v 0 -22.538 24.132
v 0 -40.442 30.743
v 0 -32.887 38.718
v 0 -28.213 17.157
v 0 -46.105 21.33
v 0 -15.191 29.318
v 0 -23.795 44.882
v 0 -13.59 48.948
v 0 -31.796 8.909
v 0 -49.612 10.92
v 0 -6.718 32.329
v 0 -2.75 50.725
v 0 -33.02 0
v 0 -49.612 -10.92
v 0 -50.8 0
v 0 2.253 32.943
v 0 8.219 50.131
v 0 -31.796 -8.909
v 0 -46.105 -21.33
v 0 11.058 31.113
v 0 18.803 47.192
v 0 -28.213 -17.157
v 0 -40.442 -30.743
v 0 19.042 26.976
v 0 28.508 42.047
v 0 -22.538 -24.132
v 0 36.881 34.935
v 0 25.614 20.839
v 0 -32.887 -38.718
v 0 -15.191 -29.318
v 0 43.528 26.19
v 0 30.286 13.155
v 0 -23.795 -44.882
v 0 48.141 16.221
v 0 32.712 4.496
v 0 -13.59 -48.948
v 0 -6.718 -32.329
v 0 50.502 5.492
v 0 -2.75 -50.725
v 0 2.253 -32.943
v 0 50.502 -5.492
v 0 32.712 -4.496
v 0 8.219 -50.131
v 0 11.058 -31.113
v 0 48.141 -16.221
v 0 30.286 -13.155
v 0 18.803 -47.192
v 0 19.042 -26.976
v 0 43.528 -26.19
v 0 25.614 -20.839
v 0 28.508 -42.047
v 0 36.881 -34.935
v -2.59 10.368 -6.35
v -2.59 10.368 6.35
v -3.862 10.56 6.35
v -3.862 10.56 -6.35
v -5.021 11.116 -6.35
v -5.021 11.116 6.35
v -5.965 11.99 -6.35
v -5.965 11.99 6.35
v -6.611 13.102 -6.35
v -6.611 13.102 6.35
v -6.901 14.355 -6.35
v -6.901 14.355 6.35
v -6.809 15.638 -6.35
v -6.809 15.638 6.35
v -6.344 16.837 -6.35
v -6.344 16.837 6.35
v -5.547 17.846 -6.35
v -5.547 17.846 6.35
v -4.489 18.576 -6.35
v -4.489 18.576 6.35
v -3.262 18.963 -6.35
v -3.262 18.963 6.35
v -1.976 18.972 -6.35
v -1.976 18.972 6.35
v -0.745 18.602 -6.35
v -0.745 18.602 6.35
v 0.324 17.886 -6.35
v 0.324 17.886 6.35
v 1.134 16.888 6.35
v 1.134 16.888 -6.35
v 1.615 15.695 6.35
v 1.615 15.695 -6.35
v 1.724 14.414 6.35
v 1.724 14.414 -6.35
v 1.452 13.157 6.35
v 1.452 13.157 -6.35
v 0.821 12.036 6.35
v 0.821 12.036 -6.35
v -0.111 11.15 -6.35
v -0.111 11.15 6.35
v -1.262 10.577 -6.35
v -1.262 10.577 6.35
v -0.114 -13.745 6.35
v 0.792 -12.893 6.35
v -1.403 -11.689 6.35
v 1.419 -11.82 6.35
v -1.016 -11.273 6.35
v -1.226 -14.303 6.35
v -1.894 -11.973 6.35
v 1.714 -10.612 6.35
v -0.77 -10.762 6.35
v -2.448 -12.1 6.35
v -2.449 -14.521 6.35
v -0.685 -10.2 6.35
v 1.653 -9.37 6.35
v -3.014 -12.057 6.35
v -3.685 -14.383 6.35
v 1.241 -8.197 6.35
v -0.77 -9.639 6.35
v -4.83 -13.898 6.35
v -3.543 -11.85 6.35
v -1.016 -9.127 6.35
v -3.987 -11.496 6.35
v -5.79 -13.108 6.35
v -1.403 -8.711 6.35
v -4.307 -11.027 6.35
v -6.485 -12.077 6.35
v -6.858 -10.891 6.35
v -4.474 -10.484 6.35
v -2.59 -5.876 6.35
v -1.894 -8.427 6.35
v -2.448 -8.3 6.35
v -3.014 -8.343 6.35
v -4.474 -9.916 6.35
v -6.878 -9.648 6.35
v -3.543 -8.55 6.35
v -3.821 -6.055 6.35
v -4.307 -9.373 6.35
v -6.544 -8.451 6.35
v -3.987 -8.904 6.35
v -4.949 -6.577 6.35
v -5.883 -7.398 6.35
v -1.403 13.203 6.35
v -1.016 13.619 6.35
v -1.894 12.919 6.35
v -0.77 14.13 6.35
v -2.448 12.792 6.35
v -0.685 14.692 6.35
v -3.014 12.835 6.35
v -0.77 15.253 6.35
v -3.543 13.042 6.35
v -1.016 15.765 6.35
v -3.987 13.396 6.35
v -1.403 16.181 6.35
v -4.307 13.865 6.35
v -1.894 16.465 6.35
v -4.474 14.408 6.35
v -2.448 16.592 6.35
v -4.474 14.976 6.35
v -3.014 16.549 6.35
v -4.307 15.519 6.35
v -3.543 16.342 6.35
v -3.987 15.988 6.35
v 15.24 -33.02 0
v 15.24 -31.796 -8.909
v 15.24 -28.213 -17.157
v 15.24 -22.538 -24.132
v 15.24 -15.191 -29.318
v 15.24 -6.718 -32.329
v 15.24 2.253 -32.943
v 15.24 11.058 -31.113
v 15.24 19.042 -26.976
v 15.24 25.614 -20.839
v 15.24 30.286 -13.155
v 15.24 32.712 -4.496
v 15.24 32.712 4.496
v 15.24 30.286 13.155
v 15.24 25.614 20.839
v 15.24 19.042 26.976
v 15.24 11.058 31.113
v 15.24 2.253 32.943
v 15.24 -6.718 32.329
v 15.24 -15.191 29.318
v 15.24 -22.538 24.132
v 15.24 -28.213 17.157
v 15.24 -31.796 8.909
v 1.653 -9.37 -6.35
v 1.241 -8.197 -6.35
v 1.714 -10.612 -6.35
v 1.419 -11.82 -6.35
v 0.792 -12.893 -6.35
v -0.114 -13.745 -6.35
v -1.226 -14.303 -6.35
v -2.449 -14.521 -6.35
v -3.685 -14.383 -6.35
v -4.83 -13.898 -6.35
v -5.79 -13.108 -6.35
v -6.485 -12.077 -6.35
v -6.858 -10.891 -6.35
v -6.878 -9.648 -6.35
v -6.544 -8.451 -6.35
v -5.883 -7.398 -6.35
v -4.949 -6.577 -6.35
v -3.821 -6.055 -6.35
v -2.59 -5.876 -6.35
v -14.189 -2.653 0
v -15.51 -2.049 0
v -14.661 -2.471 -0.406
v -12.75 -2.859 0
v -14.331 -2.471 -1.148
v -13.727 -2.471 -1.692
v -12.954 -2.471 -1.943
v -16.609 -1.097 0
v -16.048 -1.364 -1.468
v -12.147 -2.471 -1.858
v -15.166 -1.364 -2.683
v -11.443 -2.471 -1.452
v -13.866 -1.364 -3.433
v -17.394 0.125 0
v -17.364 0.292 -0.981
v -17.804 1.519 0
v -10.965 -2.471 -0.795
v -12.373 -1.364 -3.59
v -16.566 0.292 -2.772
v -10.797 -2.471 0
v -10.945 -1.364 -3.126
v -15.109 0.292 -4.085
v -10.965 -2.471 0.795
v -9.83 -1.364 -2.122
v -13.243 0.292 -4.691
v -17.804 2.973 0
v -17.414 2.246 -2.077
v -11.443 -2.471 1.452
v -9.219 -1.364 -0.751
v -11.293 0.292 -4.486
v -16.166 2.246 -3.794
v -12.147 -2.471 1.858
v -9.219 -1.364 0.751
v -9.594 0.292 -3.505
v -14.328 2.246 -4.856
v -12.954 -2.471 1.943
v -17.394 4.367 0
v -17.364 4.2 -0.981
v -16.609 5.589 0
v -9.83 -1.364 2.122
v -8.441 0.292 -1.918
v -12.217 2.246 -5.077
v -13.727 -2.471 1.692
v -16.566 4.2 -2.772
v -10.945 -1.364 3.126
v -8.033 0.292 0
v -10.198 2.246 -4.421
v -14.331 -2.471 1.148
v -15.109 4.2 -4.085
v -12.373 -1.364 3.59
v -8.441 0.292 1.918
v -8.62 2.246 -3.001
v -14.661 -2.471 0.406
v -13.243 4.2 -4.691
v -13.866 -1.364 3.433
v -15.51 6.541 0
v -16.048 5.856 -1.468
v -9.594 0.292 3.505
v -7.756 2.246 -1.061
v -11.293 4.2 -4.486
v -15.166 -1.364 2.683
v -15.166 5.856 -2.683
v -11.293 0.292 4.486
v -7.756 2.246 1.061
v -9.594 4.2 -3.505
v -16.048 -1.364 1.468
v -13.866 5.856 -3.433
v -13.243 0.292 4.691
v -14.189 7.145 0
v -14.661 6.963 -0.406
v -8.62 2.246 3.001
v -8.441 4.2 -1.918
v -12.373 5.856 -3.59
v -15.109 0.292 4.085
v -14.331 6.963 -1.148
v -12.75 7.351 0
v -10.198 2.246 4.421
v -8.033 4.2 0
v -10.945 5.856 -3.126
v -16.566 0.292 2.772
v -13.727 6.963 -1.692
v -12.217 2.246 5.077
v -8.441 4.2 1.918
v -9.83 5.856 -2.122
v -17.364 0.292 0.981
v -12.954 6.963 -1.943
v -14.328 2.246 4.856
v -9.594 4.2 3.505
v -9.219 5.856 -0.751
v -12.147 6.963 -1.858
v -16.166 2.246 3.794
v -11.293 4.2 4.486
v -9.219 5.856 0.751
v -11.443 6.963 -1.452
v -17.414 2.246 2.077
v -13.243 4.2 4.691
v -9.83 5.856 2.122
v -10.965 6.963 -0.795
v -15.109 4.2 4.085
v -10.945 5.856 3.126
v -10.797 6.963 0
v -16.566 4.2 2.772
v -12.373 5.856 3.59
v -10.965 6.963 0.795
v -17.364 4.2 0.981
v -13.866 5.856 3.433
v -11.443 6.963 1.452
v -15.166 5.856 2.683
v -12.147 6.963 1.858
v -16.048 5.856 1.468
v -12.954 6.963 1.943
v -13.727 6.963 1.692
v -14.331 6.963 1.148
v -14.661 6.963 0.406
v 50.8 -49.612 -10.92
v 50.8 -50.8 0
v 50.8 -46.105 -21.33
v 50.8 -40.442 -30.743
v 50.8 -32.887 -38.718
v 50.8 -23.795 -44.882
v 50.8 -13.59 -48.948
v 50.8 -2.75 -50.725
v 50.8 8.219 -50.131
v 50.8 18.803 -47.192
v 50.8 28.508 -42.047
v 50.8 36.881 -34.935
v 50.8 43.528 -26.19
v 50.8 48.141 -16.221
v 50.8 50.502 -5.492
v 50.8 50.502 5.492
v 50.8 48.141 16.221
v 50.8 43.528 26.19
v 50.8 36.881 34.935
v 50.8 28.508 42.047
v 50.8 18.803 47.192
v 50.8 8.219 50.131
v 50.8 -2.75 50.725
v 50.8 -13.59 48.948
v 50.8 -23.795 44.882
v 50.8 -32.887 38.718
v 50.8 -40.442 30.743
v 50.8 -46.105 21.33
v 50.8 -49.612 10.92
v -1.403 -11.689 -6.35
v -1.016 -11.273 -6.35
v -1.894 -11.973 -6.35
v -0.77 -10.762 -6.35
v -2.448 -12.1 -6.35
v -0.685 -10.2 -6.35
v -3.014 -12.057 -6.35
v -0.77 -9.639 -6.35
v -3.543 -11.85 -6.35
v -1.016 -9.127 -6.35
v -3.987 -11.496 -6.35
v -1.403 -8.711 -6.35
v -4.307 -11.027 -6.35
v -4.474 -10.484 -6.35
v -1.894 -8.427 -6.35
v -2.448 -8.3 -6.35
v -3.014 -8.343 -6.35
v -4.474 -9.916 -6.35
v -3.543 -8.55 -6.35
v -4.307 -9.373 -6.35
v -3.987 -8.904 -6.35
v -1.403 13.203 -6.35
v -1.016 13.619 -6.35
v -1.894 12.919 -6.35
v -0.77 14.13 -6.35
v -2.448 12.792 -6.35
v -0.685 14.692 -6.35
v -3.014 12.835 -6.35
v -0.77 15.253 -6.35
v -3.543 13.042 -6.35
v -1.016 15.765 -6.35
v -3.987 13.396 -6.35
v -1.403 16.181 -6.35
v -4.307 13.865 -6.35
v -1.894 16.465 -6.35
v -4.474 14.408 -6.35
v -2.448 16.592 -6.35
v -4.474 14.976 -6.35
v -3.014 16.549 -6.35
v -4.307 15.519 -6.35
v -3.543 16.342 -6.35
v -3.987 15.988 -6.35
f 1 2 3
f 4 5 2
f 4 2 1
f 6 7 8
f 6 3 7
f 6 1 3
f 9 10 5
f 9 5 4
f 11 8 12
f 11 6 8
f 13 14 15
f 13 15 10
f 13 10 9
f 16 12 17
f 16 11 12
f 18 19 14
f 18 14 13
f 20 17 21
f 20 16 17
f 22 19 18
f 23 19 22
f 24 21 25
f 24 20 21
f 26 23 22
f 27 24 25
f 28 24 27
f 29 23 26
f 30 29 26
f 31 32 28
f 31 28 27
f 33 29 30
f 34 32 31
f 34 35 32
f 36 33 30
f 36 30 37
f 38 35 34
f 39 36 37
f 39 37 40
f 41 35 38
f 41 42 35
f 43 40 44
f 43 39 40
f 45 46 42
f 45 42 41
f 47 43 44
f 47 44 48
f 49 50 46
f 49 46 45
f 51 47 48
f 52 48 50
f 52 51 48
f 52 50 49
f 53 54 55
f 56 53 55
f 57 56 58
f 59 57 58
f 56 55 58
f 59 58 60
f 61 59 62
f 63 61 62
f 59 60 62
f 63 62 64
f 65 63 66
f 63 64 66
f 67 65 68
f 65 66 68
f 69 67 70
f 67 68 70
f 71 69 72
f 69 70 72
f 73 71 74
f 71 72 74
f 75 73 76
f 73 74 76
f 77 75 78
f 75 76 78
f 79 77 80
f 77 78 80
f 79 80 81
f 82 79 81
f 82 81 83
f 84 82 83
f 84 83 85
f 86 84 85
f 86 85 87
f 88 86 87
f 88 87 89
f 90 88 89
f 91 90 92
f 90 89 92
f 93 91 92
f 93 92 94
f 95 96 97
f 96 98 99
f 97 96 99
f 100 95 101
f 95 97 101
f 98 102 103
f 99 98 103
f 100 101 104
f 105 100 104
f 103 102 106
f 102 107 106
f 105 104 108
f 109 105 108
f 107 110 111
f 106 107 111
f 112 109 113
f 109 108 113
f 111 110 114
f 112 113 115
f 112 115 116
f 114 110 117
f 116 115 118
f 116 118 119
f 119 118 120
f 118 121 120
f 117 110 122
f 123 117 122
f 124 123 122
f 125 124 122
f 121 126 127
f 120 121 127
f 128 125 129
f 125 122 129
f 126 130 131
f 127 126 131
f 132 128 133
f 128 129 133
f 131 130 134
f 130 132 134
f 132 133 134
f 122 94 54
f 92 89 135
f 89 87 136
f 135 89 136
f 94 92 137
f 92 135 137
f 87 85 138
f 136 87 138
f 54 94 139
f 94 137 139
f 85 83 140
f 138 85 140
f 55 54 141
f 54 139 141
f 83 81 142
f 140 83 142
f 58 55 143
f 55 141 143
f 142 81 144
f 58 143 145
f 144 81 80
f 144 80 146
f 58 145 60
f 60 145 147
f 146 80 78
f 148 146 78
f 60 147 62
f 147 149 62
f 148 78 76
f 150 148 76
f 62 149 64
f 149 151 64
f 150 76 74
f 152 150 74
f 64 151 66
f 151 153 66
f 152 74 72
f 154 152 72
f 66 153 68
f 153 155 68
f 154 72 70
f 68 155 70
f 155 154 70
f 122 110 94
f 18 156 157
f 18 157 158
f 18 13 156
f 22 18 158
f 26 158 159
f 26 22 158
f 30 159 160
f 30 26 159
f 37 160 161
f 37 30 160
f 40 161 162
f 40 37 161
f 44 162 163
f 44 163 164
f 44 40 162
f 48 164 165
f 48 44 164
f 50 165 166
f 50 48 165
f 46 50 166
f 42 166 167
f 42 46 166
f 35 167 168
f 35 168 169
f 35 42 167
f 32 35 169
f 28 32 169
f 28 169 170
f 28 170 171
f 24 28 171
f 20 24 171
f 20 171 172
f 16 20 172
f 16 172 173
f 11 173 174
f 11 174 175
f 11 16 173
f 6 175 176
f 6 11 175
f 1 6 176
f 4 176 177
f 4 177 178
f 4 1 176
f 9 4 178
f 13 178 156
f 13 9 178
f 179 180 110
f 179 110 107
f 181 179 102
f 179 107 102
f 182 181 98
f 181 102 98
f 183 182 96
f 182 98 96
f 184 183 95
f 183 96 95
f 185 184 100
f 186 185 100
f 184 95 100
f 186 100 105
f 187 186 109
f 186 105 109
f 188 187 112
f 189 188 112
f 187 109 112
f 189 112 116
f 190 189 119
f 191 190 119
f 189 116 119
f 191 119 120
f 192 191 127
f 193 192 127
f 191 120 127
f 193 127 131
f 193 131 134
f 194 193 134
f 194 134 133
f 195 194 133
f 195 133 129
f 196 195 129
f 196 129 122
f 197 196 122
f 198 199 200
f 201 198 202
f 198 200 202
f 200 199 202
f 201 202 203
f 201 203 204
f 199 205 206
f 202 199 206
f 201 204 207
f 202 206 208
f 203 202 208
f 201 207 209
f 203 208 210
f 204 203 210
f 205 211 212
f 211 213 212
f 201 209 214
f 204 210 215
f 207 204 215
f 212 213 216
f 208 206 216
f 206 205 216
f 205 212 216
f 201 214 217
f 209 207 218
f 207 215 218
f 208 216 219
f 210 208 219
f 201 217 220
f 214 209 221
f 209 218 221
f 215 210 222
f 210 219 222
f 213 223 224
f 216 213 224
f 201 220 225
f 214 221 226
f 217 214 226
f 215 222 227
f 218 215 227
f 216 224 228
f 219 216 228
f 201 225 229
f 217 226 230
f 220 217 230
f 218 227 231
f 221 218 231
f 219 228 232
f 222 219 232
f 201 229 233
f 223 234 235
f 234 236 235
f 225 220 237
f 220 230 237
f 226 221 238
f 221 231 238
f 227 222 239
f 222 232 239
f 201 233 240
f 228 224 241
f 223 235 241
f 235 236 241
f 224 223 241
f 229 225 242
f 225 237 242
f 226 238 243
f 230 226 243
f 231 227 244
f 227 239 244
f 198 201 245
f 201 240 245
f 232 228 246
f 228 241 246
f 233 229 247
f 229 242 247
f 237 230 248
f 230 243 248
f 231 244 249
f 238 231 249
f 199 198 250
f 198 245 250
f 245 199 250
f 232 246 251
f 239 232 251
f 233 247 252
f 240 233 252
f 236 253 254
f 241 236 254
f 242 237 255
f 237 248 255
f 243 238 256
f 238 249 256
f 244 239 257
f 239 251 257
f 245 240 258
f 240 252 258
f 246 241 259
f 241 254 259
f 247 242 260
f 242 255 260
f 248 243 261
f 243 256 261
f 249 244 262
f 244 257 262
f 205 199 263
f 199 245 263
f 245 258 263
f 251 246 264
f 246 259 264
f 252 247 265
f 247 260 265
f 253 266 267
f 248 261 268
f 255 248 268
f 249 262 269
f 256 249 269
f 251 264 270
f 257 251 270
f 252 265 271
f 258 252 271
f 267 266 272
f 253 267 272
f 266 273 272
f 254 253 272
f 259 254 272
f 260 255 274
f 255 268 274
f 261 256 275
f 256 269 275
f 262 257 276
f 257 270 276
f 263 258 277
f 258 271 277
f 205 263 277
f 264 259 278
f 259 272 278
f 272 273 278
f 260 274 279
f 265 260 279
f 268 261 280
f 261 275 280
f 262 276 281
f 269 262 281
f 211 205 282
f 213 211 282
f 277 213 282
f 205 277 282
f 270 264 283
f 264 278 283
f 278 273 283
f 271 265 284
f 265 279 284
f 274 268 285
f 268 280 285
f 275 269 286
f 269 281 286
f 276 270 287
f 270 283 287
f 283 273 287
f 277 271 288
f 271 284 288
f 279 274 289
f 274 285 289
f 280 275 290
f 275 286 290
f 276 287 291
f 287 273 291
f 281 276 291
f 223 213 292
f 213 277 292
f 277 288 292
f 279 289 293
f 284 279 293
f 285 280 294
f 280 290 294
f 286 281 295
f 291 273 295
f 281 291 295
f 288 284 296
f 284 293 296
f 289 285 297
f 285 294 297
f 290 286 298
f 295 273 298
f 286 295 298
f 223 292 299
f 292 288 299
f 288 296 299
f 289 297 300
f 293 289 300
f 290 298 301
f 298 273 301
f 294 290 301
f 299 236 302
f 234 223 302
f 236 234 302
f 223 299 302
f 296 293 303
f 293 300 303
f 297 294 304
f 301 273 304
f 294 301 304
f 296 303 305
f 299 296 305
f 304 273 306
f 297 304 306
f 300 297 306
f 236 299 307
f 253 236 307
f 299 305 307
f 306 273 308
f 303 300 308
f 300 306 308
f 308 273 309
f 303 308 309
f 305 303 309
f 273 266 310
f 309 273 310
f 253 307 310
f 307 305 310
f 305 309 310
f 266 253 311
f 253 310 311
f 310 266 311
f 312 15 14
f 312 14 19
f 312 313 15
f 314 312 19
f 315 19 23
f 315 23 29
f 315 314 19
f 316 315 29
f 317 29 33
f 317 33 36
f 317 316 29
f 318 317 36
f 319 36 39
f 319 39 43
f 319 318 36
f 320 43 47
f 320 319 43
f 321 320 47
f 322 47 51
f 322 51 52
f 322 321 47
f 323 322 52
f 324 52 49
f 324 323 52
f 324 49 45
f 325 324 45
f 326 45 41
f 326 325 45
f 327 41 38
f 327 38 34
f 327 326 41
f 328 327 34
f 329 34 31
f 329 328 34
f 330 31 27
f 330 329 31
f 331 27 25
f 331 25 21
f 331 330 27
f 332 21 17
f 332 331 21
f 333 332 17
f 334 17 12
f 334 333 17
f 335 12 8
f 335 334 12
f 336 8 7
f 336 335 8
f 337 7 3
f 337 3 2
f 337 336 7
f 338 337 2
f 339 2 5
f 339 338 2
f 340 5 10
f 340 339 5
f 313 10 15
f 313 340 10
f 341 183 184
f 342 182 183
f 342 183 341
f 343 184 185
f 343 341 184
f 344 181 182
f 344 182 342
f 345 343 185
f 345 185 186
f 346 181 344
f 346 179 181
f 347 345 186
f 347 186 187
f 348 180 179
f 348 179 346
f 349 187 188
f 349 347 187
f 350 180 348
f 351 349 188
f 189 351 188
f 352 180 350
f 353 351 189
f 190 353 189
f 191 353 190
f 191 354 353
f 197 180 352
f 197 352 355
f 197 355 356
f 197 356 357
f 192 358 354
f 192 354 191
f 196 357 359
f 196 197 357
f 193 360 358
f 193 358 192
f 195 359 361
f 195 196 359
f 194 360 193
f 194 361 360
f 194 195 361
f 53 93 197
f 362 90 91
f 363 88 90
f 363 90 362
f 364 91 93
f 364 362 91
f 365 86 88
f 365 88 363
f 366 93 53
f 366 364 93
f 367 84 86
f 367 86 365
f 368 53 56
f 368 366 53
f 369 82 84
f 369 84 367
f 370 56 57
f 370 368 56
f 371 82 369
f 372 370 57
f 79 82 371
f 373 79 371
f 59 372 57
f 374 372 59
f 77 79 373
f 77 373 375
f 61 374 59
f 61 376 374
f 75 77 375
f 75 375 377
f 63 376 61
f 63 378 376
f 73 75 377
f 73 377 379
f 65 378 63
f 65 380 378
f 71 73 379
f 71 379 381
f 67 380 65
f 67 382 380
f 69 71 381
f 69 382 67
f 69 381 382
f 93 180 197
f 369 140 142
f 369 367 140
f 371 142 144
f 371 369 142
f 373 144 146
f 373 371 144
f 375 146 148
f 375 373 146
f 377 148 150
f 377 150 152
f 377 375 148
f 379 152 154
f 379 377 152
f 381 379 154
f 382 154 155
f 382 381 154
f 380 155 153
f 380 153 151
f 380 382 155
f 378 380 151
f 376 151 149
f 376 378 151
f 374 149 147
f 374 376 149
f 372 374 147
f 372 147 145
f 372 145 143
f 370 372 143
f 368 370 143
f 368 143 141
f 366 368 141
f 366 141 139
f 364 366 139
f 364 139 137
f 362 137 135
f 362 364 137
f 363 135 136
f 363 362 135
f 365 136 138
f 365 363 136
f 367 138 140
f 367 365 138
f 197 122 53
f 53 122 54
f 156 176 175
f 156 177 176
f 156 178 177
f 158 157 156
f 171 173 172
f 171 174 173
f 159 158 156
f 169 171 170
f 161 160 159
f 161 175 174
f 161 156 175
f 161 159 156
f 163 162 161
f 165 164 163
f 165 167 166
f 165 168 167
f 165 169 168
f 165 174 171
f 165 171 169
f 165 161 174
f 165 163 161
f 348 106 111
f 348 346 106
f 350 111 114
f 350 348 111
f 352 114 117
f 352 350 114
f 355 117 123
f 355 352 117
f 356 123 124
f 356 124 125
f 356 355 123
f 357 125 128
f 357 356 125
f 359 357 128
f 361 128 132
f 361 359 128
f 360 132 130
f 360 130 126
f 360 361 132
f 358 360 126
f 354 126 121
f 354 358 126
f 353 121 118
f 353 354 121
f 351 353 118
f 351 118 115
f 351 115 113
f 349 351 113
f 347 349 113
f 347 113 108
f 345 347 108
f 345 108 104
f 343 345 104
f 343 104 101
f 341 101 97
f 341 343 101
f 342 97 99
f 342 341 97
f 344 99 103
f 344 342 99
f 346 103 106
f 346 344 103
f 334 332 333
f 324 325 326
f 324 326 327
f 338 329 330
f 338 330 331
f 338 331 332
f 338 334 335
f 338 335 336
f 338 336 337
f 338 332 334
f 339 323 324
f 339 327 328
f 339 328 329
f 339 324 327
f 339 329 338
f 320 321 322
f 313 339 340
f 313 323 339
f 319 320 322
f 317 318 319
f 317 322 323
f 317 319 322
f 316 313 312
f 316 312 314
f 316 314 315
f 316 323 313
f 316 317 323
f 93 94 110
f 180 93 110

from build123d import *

# Parameters (mm, degrees)
SKETCH3_R      = 1.905
EXTRUDE2_DEPTH = 6.35


with BuildPart() as part:
    # Sketch2 → Revolve1 (revolve)
    with BuildSketch(Plane.XY):
        Polygon((50.8, -50.8), (50.8, 0), (15.24, 0), (15.24, -33.02), (0, -33.02), (0, -50.8), align=None)
    revolve(axis=Axis((15.24, 0, 0), (1, 0, 0)))


with BuildPart() as body_2:
    # Sketch3 → Extrude2 (new, symmetric)
    with BuildSketch(Plane.XY):
        with BuildLine():
            Line((-1.262293267, 10.577377717), (1.241294824, -8.196886969))
            ThreePointArc((1.241294824, -8.196886969), (-4.829986092, -13.898279258), (-2.590267125, -5.876435023))
            Line((-2.590267125, -5.876435023), (-2.590267125, 10.368385606))
            ThreePointArc((-2.590267125, 10.368385606), (-3.262426382, 18.962997383), (-1.262293267, 10.577377717))
        make_face()
        with Locations((-2.590267125, 14.691975292)):
            Circle(SKETCH3_R, mode=Mode.SUBTRACT)
        with Locations((-2.590267125, -10.200024708)):
            Circle(SKETCH3_R, mode=Mode.SUBTRACT)
    extrude(amount=EXTRUDE2_DEPTH, both=True)


with BuildPart() as body_3:
    # Sketch4 → Revolve2 (revolve)
    with BuildSketch(Plane.XY):
        with BuildLine():
            Line((-12.750267125, 7.351375292), (-12.750267125, -2.859424708))
            ThreePointArc((-12.750267125, -2.859424708), (-17.855667125, 2.245975292), (-12.750267125, 7.351375292))
        make_face()
    revolve(axis=Axis((-12.750267125, 7.351375292, 0), (0, -1, 0)))


solid = Compound([part.part, body_2.part, body_3.part])
